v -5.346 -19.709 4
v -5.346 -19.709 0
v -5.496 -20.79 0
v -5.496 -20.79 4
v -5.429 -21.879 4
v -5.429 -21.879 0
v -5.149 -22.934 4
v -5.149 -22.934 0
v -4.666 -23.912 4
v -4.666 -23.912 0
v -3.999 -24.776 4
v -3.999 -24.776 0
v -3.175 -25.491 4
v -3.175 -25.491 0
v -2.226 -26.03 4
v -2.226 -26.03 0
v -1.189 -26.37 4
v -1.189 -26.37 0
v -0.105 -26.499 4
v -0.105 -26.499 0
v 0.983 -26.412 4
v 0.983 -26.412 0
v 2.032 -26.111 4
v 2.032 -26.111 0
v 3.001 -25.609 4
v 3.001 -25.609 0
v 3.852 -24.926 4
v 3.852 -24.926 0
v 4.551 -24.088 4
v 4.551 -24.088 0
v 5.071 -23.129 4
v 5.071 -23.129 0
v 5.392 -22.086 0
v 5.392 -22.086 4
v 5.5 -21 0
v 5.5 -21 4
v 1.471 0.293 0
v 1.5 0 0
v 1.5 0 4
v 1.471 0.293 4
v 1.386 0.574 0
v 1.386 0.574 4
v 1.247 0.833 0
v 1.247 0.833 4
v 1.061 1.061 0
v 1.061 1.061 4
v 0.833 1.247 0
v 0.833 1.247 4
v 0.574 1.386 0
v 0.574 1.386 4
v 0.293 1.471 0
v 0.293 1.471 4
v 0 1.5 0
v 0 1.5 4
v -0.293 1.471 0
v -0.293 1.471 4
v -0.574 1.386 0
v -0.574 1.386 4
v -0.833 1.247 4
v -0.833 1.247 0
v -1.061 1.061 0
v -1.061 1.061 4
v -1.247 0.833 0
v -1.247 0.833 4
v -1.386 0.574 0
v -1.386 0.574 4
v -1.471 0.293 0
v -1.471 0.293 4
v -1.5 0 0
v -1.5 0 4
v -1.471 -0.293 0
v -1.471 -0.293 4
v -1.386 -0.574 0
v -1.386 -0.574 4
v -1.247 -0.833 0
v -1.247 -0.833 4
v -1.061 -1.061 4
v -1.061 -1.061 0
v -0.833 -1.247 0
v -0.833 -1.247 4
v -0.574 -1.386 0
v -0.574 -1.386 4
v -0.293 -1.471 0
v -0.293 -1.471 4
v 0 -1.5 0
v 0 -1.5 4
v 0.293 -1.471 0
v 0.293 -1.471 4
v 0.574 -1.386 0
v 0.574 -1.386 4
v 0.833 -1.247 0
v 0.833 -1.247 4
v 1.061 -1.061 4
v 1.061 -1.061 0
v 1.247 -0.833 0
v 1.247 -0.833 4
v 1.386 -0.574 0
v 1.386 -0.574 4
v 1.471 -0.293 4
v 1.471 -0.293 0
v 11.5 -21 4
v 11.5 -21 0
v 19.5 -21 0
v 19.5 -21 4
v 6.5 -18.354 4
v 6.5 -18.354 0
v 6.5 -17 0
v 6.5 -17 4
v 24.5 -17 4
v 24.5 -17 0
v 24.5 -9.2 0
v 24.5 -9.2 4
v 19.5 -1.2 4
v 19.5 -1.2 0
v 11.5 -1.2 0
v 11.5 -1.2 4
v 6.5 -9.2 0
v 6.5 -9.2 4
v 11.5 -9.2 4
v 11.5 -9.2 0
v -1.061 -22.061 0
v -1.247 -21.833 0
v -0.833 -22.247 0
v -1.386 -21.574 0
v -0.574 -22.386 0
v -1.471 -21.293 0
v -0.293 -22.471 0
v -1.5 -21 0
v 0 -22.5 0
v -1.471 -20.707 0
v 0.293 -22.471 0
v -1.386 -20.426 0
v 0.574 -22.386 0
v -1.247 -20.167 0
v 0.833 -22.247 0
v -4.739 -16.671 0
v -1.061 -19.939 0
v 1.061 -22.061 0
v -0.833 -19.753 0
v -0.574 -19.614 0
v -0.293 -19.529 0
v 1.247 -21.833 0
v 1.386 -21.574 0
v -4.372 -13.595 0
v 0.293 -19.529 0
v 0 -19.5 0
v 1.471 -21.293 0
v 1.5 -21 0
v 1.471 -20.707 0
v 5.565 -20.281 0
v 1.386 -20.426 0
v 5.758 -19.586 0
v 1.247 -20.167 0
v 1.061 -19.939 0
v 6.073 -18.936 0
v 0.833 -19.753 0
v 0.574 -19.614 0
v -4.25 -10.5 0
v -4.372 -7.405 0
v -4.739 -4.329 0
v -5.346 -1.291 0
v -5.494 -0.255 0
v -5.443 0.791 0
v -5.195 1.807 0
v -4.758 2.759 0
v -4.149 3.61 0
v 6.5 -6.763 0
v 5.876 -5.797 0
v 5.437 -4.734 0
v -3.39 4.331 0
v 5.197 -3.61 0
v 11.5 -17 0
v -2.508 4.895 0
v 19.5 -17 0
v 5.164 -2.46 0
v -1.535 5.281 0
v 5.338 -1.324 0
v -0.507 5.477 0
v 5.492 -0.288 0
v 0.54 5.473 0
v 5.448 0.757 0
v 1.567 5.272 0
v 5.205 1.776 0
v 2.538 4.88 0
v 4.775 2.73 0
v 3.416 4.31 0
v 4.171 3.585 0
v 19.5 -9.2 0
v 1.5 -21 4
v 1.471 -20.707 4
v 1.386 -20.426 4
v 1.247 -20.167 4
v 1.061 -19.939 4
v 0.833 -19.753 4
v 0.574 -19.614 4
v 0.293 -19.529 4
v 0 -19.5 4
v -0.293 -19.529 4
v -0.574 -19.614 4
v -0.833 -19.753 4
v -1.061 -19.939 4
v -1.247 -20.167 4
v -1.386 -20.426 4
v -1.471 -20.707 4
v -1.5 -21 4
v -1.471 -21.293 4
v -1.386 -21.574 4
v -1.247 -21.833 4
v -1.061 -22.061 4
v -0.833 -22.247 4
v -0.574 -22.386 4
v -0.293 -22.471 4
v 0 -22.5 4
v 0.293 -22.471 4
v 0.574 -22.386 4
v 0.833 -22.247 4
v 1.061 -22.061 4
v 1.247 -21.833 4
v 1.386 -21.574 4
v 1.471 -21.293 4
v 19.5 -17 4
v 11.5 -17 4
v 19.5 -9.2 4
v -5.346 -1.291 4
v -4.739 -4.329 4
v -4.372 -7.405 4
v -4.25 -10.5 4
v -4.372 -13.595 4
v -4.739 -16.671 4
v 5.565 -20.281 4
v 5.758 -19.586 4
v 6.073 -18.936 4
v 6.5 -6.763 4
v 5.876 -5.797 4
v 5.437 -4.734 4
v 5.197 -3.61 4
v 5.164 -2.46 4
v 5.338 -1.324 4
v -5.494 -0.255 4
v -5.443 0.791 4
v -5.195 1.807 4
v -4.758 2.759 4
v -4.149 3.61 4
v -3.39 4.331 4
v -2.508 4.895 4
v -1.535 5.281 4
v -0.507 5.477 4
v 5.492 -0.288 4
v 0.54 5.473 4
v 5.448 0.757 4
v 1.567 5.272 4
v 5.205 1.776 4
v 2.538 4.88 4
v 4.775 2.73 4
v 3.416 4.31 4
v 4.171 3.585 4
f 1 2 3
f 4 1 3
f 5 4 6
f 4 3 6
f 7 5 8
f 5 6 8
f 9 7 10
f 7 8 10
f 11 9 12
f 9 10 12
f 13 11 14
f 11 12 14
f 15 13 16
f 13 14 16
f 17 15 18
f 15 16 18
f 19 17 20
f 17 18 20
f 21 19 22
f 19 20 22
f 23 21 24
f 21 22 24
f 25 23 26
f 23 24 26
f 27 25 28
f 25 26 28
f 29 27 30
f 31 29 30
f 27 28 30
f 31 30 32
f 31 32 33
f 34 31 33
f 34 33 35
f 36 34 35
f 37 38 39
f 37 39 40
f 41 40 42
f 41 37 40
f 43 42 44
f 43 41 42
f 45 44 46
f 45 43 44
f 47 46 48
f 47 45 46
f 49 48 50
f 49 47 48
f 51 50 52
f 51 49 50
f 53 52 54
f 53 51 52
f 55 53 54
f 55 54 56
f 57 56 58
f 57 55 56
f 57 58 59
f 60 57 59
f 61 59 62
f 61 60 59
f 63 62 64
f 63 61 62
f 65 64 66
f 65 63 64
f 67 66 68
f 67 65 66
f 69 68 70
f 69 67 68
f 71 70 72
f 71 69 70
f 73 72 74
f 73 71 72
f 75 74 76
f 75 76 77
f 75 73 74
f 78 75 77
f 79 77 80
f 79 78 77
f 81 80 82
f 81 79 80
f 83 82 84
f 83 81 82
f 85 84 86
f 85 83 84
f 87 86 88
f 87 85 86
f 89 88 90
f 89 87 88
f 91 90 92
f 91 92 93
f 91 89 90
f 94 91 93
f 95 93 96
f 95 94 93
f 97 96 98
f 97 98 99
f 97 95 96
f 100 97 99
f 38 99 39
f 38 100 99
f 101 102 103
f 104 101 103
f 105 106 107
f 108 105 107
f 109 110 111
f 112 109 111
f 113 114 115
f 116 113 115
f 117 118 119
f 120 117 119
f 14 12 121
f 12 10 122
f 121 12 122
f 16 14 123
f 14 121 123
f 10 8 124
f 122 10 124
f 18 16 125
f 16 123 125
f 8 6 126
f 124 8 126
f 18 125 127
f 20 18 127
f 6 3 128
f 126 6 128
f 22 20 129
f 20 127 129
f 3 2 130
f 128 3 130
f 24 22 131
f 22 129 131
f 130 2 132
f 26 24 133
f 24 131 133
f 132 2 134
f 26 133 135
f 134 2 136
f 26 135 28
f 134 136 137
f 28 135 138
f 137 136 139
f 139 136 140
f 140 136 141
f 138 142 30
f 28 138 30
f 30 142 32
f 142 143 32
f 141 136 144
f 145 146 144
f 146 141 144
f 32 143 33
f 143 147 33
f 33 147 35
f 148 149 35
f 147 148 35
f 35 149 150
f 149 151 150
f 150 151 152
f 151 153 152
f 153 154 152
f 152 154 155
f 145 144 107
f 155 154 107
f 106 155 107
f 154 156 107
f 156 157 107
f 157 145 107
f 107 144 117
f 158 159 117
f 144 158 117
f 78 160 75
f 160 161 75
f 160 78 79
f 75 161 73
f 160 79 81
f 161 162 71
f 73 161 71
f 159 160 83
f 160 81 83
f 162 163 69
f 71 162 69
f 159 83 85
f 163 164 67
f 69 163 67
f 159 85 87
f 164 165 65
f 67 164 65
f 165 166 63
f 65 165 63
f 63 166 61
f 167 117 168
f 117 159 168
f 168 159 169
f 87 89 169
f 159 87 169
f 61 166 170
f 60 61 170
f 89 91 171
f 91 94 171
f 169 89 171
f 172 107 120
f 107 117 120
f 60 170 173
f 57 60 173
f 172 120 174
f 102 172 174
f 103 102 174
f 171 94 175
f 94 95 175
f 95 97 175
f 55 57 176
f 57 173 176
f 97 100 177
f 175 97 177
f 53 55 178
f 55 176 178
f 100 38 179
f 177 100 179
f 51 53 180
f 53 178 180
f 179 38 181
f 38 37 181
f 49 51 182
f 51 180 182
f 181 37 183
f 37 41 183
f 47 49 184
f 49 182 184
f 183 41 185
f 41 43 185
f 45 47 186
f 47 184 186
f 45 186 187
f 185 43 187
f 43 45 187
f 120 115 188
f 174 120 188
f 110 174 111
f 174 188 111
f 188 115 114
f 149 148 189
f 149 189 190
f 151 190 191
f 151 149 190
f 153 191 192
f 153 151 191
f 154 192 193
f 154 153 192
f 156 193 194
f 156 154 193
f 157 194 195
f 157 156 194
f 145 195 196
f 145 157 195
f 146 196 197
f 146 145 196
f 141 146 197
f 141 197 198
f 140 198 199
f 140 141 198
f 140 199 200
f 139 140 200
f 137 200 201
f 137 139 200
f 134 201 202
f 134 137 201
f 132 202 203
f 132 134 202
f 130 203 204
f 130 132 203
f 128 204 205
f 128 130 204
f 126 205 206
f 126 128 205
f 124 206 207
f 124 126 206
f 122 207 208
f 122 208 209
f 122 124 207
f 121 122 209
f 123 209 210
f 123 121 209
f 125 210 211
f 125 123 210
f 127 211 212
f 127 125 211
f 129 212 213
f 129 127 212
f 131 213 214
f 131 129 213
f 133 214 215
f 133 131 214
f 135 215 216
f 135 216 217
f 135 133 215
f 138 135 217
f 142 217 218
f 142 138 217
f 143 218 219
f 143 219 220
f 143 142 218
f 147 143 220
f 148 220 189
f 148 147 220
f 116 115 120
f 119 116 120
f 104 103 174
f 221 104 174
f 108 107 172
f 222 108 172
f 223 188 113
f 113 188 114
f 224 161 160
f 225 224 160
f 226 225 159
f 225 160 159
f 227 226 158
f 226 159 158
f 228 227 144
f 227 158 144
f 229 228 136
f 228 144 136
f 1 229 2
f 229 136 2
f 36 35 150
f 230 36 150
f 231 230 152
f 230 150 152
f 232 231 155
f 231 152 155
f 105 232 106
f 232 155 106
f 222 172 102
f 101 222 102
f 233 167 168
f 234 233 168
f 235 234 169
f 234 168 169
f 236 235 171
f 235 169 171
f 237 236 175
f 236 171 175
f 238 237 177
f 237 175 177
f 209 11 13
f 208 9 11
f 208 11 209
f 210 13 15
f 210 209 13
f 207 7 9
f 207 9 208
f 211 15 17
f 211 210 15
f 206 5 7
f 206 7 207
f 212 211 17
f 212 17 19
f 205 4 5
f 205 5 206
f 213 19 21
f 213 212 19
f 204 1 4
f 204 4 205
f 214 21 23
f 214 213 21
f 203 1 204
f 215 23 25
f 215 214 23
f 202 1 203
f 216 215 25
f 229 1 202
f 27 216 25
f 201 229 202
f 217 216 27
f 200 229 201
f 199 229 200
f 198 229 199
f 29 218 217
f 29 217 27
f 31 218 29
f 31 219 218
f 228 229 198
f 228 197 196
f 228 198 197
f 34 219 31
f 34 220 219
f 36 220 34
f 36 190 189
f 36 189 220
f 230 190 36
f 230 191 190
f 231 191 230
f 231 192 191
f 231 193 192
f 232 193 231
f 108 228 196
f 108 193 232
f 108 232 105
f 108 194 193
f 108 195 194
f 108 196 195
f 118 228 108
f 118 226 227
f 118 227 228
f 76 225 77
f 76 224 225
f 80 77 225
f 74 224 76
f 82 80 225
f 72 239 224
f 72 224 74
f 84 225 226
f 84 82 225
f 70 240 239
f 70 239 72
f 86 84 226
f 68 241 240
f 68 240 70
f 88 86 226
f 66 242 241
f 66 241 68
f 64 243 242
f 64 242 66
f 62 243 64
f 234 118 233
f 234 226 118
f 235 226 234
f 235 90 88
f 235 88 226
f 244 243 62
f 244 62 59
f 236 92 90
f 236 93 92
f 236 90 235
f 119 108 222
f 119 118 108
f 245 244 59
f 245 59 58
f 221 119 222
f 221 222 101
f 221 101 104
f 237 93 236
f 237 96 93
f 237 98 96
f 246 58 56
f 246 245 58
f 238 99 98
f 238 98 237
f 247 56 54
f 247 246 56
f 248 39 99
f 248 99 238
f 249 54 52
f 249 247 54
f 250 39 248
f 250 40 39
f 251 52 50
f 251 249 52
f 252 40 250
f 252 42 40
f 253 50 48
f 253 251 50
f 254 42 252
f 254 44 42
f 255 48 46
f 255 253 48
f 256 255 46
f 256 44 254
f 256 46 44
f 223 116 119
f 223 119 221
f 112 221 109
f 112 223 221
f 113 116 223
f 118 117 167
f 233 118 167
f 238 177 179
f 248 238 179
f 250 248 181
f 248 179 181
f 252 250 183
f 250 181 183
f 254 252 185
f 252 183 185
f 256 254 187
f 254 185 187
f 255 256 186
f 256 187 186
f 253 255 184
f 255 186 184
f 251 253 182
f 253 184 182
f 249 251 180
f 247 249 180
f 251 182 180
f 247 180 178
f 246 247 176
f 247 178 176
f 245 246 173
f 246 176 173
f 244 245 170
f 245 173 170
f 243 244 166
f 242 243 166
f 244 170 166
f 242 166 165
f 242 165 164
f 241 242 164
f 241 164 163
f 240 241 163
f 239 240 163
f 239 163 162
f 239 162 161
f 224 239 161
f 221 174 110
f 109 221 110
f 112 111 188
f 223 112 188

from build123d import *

# Parameters (mm, degrees)
SKETCH1_R           = 1.5
BOSS_EXTRUDE1_DEPTH = 4
SKETCH2_W           = 5
SKETCH2_H           = 5
CUT_EXTRUDE1_DEPTH  = 4


with BuildPart() as part:
    # Sketch1 → Boss-Extrude1 (new body)
    with BuildSketch(Plane.XY):
        with BuildLine():
            Line((11.5, -1.2), (11.5, -9.2))
            ThreePointArc((11.5, -9.2), (6.499964862, -6.763292795), (5.338318884, -1.323764138))
            ThreePointArc((5.338318884, -1.323764138), (0.016750191, 5.499974494), (-5.34628284, -1.291224148))
            ThreePointArc((-5.34628284, -1.291224148), (-4.25, -10.5), (-5.34628284, -19.708775852))
            ThreePointArc((-5.34628284, -19.708775852), (-0.650170894, -26.461435508), (5.5, -21))
            ThreePointArc((5.5, -21), (6.671572875, -18.171572875), (9.5, -17))
            Line((9.5, -17), (11.5, -17))
            Line((11.5, -17), (11.5, -21))
            Line((11.5, -21), (19.5, -21))
            Line((19.5, -21), (19.5, -17))
            Line((19.5, -17), (24.5, -17))
            Line((24.5, -17), (24.5, -9.2))
            Line((24.5, -9.2), (19.5, -9.2))
            Line((19.5, -9.2), (19.5, -1.2))
            Line((19.5, -1.2), (11.5, -1.2))
        make_face()
        Circle(SKETCH1_R, mode=Mode.SUBTRACT)
        with Locations((0, -21)):
            Circle(SKETCH1_R, mode=Mode.SUBTRACT)
    extrude(amount=BOSS_EXTRUDE1_DEPTH)

    # Sketch2 → Cut-Extrude1 (cut)
    with BuildSketch(Plane.XY.offset(4)):
        with Locations((9, -6.7)):
            Rectangle(SKETCH2_W, SKETCH2_H)
        with Locations((9, -19.5)):
            Rectangle(SKETCH2_W, SKETCH2_H)
    extrude(amount=-CUT_EXTRUDE1_DEPTH, mode=Mode.SUBTRACT)


solid = part.part
